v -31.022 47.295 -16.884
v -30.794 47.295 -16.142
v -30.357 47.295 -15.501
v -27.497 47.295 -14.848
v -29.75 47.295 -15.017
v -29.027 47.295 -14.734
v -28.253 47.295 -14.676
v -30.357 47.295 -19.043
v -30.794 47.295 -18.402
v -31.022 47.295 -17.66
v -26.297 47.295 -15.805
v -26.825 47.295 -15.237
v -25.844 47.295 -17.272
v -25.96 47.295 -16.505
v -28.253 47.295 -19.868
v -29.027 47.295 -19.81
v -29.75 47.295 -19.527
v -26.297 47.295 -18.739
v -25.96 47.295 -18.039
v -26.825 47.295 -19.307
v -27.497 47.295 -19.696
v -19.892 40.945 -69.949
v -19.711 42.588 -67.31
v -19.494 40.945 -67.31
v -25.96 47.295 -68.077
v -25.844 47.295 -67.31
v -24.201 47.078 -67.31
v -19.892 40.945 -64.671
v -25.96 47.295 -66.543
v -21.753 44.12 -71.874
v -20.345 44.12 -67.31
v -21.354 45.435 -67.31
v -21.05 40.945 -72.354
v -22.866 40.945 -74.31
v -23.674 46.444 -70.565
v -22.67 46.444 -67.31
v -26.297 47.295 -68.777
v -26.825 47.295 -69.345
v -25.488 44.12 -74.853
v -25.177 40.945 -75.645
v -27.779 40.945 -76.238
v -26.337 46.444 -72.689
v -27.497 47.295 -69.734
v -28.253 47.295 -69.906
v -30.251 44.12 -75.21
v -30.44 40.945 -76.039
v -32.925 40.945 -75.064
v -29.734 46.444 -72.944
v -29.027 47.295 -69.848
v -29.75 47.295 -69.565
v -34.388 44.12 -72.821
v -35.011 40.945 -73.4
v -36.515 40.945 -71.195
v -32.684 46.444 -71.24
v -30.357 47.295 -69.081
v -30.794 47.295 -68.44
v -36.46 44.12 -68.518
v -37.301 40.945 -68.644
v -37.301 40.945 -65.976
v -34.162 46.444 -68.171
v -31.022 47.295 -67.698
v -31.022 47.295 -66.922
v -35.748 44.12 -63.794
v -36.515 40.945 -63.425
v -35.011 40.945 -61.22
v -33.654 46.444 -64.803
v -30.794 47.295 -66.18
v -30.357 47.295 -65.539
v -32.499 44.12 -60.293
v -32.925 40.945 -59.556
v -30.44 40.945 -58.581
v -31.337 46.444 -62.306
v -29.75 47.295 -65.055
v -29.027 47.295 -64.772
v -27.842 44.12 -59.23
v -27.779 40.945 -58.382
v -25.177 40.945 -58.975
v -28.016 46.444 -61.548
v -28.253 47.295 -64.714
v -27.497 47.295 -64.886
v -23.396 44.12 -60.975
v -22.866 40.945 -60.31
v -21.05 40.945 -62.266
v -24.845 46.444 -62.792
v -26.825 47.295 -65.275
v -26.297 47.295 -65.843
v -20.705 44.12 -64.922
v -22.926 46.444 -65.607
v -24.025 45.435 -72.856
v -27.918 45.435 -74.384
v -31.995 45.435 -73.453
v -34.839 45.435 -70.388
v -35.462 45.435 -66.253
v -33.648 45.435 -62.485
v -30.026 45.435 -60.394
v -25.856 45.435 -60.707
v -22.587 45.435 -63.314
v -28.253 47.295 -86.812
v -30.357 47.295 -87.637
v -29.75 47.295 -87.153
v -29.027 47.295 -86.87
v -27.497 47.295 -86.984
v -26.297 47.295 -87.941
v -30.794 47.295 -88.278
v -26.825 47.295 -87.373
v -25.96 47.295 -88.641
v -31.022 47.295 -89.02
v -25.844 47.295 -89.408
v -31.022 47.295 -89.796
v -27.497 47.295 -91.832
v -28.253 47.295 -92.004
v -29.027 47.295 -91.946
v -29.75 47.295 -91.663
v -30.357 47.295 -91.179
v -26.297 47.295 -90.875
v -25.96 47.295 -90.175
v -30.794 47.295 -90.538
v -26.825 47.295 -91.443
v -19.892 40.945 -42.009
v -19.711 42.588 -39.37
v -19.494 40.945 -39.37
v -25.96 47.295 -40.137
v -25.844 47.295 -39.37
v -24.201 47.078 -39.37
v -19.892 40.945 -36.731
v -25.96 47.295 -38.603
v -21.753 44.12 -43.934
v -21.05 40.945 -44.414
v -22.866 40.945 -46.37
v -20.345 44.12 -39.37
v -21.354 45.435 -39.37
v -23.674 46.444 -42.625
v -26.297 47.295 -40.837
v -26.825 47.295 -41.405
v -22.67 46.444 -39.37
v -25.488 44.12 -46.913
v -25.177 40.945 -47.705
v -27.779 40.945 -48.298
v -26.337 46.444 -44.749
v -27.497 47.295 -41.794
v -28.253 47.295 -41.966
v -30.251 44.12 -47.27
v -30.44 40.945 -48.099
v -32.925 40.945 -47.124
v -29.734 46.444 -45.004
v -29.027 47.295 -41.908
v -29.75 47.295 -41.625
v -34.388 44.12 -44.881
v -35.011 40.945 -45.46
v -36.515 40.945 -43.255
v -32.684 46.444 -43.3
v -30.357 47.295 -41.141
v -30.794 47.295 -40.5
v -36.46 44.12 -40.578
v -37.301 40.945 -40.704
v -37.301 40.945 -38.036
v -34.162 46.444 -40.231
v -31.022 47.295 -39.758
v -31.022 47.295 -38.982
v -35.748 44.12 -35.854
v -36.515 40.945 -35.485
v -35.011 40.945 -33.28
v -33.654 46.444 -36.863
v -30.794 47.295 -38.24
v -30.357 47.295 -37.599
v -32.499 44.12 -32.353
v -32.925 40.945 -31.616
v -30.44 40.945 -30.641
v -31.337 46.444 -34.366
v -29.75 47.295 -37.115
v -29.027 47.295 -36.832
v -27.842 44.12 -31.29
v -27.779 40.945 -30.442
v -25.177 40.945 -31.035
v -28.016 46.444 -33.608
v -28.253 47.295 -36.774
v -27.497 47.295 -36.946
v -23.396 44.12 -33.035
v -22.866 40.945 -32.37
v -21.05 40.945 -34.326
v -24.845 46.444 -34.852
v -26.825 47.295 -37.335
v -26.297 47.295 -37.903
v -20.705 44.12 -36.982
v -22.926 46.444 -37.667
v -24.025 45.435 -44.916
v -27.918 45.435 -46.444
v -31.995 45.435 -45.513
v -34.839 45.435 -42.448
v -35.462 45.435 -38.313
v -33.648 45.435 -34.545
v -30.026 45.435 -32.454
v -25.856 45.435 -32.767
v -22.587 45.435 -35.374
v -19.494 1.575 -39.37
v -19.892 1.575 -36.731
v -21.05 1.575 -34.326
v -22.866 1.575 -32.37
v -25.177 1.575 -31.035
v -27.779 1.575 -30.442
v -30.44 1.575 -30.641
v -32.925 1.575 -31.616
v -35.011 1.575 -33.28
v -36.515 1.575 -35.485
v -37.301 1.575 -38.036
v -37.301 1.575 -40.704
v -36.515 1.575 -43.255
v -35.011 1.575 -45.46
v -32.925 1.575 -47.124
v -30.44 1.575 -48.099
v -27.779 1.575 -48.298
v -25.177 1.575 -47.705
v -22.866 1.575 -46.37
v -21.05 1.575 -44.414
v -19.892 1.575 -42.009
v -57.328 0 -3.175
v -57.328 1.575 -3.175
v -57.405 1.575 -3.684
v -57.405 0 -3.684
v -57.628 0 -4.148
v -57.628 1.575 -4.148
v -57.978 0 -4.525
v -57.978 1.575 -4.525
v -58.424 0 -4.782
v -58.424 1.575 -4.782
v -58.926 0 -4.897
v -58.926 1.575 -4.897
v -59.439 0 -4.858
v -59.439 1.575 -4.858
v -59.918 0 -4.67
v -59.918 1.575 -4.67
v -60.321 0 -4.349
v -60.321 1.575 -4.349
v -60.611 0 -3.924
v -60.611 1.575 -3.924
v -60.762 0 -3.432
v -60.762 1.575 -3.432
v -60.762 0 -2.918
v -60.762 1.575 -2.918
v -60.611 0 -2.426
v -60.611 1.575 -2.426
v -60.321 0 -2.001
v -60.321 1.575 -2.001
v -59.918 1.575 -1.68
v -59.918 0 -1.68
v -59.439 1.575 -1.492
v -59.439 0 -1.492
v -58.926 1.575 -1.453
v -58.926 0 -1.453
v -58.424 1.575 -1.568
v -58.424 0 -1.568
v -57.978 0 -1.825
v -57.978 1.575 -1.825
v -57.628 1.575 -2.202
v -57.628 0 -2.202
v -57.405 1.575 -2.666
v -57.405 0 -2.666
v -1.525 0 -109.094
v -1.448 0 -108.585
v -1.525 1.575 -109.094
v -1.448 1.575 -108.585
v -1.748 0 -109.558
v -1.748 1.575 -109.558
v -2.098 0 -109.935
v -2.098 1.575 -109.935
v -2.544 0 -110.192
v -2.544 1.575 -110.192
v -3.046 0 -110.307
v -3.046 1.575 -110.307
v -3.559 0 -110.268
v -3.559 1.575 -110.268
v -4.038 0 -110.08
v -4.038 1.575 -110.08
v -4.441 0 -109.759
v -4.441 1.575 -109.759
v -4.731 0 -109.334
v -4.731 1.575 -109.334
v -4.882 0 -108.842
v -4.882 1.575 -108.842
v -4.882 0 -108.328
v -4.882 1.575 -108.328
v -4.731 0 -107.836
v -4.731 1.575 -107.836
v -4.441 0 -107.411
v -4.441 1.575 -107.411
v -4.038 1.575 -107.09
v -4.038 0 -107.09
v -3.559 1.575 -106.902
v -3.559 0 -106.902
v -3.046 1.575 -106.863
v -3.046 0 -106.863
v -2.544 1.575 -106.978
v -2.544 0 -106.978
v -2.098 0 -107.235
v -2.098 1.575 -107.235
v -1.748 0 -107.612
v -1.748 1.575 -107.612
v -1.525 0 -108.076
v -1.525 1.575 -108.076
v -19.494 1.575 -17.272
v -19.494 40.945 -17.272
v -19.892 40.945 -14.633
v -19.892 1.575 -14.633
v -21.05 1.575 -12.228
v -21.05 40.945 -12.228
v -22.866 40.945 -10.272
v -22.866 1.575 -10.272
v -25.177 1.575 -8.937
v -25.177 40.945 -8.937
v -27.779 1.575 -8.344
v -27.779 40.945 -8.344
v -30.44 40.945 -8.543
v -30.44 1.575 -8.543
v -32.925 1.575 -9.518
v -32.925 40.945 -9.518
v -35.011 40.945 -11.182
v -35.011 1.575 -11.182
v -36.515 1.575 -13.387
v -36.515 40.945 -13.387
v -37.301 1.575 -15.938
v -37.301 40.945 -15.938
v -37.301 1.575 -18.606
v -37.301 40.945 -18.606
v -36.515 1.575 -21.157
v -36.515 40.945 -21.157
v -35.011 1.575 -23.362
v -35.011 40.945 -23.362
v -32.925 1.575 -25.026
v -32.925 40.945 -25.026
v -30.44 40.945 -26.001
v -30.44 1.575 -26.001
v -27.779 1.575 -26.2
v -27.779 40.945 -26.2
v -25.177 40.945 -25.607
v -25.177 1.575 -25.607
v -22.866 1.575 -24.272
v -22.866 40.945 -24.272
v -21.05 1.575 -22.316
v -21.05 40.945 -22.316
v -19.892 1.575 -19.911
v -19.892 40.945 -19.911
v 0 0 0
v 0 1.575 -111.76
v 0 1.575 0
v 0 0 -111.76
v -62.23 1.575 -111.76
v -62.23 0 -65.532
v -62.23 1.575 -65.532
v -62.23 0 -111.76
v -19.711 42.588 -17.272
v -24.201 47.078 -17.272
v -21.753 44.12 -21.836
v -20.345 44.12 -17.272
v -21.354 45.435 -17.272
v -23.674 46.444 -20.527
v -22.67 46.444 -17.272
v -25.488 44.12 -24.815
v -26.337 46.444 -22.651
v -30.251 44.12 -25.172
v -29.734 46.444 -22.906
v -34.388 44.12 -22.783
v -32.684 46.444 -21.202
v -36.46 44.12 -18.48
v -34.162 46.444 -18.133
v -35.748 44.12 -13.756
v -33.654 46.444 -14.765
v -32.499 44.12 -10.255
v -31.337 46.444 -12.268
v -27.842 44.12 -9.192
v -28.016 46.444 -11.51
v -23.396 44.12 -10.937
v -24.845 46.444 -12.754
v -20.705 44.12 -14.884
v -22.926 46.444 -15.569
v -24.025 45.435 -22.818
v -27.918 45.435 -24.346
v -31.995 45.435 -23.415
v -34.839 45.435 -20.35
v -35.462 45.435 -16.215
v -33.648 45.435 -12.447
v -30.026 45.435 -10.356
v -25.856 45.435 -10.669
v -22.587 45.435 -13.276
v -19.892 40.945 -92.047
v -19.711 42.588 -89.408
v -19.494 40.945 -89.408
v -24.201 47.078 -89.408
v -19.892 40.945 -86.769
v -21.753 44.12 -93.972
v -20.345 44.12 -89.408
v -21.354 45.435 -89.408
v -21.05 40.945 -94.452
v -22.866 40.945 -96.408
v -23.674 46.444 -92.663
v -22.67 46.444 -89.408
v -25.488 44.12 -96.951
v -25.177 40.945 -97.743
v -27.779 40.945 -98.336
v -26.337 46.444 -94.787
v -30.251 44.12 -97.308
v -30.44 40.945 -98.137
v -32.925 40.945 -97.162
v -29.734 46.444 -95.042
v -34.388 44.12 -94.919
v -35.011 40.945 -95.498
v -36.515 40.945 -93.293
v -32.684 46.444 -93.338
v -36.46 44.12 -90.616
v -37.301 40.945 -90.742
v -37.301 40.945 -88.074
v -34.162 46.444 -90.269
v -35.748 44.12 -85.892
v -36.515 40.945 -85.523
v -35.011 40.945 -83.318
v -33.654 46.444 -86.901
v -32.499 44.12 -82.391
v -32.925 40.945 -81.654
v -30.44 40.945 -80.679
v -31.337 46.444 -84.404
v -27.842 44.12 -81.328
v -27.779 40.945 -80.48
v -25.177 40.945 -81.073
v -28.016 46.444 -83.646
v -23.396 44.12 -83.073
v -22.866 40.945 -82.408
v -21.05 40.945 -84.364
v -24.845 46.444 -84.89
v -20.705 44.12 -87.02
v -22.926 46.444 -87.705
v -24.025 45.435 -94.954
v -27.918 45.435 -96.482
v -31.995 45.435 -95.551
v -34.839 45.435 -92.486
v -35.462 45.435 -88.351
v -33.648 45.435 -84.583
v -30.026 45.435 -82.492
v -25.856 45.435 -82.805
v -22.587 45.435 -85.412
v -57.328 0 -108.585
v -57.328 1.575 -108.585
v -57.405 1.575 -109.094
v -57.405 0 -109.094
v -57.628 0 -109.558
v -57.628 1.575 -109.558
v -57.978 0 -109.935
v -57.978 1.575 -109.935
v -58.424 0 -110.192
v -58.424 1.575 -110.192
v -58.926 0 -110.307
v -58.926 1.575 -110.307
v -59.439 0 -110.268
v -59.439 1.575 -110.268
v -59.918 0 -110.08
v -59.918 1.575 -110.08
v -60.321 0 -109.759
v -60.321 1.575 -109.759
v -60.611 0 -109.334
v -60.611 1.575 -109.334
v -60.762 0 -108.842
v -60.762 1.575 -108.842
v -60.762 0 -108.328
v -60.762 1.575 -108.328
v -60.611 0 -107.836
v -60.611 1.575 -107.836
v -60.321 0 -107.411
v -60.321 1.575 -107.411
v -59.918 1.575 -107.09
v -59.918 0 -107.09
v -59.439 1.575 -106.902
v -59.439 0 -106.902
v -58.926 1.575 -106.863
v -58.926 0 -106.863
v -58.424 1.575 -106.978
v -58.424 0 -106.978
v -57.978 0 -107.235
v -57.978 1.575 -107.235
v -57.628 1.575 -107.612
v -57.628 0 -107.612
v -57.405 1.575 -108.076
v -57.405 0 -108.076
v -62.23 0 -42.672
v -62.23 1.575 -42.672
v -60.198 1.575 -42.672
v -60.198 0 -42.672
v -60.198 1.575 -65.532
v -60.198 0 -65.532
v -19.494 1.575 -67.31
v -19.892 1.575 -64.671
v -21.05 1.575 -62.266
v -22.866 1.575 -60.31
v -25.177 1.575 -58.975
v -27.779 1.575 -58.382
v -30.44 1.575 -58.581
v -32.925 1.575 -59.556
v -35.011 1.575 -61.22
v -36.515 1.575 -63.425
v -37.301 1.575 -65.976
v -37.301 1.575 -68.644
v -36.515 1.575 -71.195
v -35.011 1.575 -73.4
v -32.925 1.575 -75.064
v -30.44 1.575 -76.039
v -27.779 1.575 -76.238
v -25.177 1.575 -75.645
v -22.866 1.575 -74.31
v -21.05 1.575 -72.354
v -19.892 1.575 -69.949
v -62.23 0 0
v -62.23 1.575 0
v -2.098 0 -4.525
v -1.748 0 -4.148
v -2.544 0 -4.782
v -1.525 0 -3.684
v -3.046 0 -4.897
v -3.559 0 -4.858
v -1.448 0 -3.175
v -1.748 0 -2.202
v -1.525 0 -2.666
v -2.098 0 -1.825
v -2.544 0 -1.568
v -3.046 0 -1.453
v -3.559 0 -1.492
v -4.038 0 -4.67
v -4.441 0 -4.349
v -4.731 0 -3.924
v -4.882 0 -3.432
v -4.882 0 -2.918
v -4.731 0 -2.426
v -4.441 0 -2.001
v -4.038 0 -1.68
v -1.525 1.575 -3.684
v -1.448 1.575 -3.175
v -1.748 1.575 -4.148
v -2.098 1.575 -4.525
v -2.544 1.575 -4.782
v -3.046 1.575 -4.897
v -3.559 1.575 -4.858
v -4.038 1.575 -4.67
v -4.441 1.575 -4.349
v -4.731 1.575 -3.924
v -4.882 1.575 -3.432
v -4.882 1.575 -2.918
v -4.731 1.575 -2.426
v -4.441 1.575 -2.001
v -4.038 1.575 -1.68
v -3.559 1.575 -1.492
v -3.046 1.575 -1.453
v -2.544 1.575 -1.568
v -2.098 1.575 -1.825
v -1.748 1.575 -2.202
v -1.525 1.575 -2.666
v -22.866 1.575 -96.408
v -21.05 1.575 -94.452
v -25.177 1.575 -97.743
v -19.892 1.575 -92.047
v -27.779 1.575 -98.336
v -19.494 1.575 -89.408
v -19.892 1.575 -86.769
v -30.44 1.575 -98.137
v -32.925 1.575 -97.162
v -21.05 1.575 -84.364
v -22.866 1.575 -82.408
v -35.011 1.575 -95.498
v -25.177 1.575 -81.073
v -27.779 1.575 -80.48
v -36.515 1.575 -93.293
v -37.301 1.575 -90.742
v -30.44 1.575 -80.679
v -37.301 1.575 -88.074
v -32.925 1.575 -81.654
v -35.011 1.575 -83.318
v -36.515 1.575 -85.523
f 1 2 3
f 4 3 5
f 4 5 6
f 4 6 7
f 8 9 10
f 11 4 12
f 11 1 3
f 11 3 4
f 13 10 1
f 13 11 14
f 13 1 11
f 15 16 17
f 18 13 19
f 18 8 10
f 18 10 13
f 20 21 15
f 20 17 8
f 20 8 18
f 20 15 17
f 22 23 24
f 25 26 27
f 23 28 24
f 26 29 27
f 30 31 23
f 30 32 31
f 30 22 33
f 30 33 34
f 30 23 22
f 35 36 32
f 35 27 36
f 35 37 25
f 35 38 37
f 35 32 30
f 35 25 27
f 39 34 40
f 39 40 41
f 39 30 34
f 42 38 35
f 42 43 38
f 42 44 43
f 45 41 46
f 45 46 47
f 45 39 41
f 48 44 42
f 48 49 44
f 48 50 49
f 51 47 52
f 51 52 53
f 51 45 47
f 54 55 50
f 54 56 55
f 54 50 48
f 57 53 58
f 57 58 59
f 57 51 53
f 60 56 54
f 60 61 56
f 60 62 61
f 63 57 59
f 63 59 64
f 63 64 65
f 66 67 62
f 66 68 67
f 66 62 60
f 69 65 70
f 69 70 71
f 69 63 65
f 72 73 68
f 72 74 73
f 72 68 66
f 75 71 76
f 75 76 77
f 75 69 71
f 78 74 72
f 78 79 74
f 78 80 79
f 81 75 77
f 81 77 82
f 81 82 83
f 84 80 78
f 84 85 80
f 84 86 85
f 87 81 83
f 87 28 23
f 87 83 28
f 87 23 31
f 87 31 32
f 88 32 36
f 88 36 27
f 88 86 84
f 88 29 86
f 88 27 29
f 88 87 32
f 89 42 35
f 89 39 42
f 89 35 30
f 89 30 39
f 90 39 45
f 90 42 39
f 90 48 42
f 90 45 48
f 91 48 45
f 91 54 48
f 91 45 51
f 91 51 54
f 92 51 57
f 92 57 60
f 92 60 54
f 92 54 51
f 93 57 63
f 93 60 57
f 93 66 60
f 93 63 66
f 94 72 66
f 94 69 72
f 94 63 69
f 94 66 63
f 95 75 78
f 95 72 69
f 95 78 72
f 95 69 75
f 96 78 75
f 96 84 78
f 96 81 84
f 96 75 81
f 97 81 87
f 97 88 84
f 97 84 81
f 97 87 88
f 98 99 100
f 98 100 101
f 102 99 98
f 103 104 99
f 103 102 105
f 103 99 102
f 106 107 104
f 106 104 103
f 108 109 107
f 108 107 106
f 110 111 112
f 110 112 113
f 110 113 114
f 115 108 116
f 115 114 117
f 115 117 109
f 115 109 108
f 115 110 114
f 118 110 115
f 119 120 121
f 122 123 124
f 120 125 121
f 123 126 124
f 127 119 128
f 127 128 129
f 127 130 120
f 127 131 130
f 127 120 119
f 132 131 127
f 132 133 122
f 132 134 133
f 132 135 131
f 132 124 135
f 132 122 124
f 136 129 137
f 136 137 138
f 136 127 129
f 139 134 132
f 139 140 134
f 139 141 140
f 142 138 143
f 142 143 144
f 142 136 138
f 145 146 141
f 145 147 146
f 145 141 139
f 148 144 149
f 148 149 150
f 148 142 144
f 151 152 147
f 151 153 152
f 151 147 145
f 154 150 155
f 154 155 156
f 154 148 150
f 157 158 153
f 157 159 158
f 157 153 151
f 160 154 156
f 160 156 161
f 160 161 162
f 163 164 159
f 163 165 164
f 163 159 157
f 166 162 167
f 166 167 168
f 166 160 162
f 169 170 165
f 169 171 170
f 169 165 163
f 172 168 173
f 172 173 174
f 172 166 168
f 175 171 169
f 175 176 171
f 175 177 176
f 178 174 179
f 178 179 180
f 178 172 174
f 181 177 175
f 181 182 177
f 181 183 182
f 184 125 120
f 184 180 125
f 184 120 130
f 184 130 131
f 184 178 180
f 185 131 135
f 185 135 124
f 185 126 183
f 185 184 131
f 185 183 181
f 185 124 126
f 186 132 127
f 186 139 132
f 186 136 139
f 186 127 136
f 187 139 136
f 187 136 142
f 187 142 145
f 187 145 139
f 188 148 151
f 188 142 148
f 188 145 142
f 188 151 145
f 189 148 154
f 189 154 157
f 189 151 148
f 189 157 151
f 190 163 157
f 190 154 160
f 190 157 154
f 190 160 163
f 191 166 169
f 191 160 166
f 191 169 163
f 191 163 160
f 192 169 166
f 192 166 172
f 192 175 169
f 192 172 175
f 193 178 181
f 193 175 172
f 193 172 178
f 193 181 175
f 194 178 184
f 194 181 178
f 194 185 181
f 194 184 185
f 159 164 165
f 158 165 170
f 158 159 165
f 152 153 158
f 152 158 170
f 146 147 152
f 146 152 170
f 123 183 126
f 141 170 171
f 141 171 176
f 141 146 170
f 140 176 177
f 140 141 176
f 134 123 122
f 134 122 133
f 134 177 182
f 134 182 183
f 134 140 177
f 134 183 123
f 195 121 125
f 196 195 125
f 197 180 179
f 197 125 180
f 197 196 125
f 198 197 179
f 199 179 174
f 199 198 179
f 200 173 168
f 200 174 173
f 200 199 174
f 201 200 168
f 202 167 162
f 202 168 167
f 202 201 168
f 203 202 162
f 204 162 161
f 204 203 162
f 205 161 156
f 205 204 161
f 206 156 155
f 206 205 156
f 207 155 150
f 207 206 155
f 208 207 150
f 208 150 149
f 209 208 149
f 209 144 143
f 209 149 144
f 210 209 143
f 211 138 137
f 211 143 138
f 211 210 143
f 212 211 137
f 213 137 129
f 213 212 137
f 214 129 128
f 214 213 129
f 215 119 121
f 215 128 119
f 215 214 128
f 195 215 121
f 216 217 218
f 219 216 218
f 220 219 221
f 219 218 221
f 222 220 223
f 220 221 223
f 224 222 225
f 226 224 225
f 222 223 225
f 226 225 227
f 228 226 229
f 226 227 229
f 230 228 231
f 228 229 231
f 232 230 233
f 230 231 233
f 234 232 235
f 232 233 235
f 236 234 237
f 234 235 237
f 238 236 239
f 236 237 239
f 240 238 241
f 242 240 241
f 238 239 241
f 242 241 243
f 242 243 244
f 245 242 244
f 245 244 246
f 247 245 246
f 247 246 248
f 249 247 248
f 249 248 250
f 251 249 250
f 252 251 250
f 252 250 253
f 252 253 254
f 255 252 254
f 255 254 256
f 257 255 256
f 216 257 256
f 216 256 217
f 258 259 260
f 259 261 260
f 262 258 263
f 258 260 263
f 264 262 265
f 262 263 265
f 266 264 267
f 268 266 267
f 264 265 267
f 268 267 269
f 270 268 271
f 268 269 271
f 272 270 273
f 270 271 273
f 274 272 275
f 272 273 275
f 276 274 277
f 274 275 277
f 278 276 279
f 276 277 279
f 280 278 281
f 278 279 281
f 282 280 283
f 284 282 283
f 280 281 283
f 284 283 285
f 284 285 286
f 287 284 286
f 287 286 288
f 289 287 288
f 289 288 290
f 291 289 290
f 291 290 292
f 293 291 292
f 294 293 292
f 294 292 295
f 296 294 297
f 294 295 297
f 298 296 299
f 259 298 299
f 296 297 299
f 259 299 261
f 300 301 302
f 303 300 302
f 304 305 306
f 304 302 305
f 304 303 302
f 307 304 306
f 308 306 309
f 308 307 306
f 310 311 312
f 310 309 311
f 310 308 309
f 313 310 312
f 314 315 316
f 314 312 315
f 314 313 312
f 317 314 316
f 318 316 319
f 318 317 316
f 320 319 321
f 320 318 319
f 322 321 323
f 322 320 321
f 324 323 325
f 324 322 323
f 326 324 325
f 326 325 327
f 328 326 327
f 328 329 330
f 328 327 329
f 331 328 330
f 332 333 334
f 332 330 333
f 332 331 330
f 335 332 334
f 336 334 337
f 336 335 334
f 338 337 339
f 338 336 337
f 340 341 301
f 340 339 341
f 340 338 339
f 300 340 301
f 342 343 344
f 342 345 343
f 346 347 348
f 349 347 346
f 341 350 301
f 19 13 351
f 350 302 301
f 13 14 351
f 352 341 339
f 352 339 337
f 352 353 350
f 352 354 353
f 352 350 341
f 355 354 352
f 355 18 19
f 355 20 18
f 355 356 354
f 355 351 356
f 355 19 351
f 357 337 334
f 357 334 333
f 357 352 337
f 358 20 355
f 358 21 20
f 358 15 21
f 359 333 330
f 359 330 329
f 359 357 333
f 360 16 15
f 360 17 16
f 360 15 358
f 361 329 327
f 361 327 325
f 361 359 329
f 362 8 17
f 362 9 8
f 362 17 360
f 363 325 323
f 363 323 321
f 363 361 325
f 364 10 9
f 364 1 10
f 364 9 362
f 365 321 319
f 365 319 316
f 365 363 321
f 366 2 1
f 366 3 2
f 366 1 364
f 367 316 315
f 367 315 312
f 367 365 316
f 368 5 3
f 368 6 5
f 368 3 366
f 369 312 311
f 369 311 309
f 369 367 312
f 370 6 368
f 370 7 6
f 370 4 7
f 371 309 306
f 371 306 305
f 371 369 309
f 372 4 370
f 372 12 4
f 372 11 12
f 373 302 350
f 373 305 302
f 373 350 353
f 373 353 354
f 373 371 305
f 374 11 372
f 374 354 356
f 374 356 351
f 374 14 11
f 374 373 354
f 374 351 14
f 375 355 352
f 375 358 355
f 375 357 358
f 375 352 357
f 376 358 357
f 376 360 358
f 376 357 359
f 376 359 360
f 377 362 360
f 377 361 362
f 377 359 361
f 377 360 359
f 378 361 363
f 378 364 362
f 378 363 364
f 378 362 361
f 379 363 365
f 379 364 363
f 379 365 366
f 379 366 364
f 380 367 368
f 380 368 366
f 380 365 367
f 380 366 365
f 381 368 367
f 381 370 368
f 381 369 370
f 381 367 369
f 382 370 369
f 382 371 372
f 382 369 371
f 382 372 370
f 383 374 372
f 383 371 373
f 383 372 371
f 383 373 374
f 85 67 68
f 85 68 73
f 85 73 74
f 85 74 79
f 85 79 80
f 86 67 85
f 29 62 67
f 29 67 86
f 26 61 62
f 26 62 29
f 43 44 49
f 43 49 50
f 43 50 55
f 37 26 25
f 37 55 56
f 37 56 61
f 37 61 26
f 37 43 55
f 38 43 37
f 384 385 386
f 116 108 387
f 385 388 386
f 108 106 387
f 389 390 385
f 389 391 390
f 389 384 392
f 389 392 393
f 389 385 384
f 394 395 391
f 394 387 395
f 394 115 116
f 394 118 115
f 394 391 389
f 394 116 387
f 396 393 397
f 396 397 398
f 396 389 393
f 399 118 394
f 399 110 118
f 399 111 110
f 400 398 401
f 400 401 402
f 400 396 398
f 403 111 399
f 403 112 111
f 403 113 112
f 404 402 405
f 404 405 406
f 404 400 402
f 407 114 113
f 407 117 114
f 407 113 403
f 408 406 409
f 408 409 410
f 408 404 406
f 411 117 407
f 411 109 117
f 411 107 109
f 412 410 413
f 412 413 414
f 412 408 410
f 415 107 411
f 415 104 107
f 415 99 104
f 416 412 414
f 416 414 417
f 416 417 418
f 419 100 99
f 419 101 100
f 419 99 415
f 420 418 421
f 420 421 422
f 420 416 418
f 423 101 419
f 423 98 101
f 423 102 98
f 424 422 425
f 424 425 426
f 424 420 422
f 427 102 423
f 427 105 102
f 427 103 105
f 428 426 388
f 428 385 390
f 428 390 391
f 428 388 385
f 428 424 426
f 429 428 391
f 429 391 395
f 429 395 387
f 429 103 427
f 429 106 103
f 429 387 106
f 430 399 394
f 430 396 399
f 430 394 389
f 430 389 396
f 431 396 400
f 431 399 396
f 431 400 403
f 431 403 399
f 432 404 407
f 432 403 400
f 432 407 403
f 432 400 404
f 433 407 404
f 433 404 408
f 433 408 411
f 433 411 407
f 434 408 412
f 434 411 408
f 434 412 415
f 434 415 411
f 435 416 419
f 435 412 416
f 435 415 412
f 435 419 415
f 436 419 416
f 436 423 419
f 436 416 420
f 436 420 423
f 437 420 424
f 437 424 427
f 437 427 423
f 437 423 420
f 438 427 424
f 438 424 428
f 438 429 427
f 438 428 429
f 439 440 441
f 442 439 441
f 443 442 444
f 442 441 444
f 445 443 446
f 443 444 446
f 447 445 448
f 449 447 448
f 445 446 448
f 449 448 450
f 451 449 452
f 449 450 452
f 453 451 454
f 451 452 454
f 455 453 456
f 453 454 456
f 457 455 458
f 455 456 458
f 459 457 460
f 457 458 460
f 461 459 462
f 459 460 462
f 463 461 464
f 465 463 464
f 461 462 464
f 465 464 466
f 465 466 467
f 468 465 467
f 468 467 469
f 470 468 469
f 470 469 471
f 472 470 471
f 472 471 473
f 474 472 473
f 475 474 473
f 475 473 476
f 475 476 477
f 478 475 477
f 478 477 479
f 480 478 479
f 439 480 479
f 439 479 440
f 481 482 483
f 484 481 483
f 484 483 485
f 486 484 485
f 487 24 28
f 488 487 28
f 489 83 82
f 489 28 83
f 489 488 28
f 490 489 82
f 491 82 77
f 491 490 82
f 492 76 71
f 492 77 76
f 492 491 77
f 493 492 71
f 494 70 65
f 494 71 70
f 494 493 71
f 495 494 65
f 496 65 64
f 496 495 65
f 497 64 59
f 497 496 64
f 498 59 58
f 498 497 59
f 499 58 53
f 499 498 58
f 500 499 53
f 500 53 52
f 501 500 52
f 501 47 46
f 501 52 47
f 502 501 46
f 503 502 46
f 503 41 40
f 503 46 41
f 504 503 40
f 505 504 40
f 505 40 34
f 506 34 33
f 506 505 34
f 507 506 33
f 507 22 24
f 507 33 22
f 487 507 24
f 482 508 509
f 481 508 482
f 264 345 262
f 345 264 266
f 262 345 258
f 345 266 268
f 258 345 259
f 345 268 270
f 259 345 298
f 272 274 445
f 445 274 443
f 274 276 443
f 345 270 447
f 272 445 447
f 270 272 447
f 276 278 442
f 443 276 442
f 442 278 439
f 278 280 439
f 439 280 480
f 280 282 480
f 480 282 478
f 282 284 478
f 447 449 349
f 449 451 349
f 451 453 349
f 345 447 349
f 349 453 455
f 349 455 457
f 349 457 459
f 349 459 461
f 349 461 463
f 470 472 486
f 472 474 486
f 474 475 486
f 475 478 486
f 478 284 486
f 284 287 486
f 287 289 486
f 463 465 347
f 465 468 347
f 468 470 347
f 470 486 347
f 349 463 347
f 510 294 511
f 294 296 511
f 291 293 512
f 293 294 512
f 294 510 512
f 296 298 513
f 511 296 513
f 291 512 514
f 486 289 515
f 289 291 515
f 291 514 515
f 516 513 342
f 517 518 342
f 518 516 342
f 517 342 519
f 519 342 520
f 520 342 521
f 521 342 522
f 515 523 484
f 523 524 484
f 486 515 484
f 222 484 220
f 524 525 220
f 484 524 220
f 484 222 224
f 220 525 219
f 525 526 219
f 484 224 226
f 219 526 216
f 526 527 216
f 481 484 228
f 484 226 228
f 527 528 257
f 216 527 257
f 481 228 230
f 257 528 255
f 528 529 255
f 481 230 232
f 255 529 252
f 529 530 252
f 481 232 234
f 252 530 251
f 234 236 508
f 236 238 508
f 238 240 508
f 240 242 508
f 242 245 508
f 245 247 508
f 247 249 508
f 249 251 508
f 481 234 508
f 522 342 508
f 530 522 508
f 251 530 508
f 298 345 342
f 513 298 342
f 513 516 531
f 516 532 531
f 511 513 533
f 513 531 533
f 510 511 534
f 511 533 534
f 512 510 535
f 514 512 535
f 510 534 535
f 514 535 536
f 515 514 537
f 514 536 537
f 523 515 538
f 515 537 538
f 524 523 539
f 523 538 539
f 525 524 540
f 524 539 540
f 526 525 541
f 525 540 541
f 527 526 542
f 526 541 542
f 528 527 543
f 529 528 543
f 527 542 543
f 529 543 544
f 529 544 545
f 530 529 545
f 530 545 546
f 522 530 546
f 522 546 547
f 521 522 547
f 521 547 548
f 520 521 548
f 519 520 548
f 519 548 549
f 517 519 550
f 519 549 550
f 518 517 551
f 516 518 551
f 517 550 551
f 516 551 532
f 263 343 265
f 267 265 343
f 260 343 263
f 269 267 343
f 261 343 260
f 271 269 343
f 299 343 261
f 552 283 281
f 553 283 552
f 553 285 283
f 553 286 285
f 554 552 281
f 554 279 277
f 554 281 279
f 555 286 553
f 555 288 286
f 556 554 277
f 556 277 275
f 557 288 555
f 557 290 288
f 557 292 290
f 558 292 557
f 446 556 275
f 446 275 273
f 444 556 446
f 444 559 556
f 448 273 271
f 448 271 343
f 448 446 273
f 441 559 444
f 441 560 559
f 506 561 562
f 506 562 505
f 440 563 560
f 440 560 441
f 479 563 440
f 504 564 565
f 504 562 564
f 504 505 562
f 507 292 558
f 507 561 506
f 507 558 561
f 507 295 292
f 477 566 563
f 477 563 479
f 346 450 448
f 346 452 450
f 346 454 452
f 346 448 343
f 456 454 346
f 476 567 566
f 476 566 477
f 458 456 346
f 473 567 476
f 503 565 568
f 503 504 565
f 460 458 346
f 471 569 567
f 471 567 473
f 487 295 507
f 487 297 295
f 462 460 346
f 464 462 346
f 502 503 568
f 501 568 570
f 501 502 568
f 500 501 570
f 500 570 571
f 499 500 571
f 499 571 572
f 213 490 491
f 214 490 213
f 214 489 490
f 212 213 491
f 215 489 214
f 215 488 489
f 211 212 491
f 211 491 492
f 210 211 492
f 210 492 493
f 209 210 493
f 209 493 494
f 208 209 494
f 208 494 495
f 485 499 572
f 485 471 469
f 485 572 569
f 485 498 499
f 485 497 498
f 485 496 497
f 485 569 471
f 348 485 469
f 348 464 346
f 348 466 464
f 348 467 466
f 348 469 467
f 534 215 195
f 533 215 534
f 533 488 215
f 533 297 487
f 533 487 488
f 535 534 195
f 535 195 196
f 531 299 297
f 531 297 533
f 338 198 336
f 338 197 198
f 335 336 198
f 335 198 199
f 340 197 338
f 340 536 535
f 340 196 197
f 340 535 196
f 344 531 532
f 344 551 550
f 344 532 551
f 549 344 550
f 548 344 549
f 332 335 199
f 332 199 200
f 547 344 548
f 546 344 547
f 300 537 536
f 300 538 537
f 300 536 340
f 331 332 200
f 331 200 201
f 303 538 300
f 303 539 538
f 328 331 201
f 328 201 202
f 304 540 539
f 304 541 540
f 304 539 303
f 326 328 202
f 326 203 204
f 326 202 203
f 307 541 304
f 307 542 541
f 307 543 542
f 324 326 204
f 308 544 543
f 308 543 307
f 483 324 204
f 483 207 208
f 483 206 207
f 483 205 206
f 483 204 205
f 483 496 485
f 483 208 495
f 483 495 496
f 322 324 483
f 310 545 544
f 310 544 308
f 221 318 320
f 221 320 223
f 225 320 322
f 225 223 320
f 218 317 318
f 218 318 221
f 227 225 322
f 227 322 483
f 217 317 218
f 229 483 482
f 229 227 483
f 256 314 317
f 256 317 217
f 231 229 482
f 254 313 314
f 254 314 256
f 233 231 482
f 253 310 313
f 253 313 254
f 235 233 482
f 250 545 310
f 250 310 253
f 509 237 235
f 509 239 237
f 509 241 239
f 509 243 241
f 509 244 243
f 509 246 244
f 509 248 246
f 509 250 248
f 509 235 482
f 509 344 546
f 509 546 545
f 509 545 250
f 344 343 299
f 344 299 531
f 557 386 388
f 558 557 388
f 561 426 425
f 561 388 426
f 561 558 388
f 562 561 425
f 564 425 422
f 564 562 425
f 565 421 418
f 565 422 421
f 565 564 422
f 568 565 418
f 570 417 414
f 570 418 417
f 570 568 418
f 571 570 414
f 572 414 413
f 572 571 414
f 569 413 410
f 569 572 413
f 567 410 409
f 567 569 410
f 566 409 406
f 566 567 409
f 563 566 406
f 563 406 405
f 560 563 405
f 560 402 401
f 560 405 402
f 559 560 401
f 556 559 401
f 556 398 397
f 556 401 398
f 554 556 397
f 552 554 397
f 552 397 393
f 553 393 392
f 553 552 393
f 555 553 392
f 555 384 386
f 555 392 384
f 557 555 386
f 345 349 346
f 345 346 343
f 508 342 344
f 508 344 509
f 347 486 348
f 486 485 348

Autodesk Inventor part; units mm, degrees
ref_plane "YZ Plane" through (0, 0, 0) normal (1, 0, 0) x (0, 1, 0)
ref_plane "XZ Plane" through (0, 0, 0) normal (0, 1, 0) x (-1, 0, 0)
ref_plane "XY Plane" through (0, 0, 0) normal (0, 0, 1) x (1, 0, 0)
sketch "Sketch3" plane through (0, 0, 0) normal (0, 1, 0) x (-1, 0, 0)
  line L0 (0, 0) -> (62.23, 0)
  line L1 (62.23, 0) -> (62.23, -111.76)
  line L2 (62.23, -111.76) -> (0, -111.76)
  line L3 (0, -111.76) -> (0, 0)
  dimension "d53" = 62.23
  dimension "d54" = 111.76
extrude "Extrusion4" add sketch "Sketch3" along normal blind 1.5748
sketch "Sketch4" plane through (0, 1.5748, 0) normal (0, 1, 0) x (1, 0, 0)
  line L0 (-62.23, 0) -> (0, 0) projected
  line L1 (0, 0) -> (0, 111.76) projected
  line L2 (0, 111.76) -> (-62.23, 111.76) projected
  line L3 (-62.23, 111.76) -> (-62.23, 0) projected
  circle A0 centre (-59.055, 3.175) radius 1.7266
  circle A1 centre (-59.055, 108.585) radius 1.7266
  circle A2 centre (-3.175, 108.585) radius 1.7266
  circle A3 centre (-3.175, 3.175) radius 1.7266
  dimension "d57" = 3.4531
  dimension "d58" = 3.4531
  dimension "d59" = 3.4531
  dimension "d60" = 3.4531
  dimension "d61" = 3.175
  dimension "d62" = 3.175
  dimension "d63" = 3.175
  dimension "d64" = 3.175
  dimension "d65" = 3.175
  dimension "d66" = 3.175
  dimension "d67" = 3.175
  dimension "d68" = 3.175
extrude "Extrusion5" cut sketch "Sketch4" against normal blind 2.54 contours A0 | A1 | A2 | A3
sketch "Sketch5" plane through (0, 1.5748, 0) normal (0, 1, 0) x (1, 0, 0)
  circle A0 centre (-28.448, 17.272) radius 8.9535
  circle A1 centre (-28.448, 39.37) radius 8.9535
  circle A2 centre (-28.448, 67.31) radius 8.9535
  circle A3 centre (-28.448, 89.408) radius 8.9535
  line L0 (-62.23, 0) -> (0, 0) projected
  line L1 (0, 0) -> (0, 111.76) projected
  line L2 (-62.23, 111.76) -> (-62.23, 0) projected
  dimension "d71" = 17.907
  dimension "d72" = 17.907
  dimension "d73" = 17.907
  dimension "d74" = 17.907
  dimension "d75" = 17.272
  dimension "d78" = 22.098
  dimension "d80" = 27.94
  dimension "d82" = 22.098
  dimension "d86" = 33.782
extrude "Extrusion6" add sketch "Sketch5" along normal blind 45.72
fillet "Fillet2" radius 6.35 4 edges at (-37.4015, 47.2948, -17.272) (-37.4015, 47.2948, -39.37) (-37.4015, 47.2948, -67.31) (-37.4015, 47.2948, -89.408)
sketch "Sketch6" plane through (0, 1.5748, 0) normal (0, 1, 0) x (1, 0, 0)
  line L0 (-62.23, 111.76) -> (-62.23, 0) projected
  line L1 (-62.23, 0) -> (-62.23, 42.672)
  line L2 (-62.23, 42.672) -> (-60.198, 42.672)
  line L3 (-60.198, 42.672) -> (-60.198, 65.532)
  line L4 (-60.198, 65.532) -> (-62.23, 65.532)
  line L5 (-62.23, 42.672) -> (-62.23, 65.532)
  point P0 (0, 0)
  dimension "d87" = 42.672
  dimension "d88" = 2.032
  dimension "d89" = 22.86
extrude "Extrusion7" cut sketch "Sketch6" against normal blind 45.72
properties part number "PCB"
